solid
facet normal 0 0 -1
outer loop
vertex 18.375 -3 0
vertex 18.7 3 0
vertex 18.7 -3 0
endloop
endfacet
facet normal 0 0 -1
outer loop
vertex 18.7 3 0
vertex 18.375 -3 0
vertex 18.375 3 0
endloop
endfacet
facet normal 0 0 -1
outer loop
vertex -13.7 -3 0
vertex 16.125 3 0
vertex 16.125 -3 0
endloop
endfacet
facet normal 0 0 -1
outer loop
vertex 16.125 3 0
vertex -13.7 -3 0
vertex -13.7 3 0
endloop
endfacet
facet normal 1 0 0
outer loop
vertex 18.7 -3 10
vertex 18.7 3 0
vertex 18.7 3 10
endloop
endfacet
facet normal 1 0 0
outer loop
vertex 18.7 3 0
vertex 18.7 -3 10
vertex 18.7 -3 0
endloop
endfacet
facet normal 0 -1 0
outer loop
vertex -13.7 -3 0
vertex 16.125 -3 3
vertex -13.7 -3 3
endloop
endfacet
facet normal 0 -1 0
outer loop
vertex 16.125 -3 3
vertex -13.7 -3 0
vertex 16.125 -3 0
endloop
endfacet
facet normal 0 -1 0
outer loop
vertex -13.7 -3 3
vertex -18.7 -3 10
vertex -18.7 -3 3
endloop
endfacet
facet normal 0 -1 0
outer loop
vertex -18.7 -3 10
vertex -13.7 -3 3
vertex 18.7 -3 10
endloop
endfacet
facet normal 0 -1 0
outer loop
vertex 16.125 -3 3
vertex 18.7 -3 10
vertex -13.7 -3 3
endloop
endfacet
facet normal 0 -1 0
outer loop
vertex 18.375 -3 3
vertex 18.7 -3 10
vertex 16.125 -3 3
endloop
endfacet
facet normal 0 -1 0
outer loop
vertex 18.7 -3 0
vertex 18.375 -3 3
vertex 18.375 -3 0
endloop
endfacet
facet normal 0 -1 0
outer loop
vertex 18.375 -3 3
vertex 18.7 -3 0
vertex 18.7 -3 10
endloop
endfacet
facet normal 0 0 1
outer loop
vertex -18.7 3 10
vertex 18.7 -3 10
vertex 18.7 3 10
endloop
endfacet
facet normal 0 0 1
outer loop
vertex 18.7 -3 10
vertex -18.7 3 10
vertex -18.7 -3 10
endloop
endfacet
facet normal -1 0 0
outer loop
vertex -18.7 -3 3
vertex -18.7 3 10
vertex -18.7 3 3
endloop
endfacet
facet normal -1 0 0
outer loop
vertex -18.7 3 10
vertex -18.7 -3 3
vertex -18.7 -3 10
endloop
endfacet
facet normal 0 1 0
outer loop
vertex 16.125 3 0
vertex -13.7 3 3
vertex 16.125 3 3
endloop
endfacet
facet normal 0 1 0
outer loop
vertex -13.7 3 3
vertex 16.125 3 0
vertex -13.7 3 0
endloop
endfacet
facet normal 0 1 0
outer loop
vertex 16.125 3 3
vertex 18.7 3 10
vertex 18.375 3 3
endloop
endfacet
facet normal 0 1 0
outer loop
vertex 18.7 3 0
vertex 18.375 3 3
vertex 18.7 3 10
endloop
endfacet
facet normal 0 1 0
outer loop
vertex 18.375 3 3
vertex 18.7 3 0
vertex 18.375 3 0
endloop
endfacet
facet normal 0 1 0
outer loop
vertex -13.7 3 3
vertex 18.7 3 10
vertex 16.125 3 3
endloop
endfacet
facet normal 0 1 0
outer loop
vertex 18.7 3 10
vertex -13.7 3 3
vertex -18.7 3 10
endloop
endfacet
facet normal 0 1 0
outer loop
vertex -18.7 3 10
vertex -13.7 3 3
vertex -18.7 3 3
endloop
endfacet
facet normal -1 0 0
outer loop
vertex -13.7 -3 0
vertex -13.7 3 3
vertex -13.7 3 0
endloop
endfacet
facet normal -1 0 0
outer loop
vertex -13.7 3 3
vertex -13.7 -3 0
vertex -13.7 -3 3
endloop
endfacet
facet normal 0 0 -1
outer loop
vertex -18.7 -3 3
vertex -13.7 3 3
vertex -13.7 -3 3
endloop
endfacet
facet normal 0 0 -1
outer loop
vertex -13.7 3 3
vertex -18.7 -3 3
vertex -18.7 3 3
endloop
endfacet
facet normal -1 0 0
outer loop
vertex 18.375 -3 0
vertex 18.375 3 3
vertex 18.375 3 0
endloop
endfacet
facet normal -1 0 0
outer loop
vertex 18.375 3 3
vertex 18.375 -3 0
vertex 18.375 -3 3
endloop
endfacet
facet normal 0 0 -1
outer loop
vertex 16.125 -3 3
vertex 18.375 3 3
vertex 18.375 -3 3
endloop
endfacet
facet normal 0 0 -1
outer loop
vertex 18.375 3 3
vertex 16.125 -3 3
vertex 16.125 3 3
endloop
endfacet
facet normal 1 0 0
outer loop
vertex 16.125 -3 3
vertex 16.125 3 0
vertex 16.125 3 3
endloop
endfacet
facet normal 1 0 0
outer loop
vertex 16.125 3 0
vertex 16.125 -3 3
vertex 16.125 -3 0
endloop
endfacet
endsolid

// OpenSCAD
// Built by bench/smallmodels/features/compiler.py from a list of features.
$fn = 64;
difference() {
  union() {
    translate([0, 0, 0]) linear_extrude(height = 10) polygon([[-18.7, -3], [18.7, -3], [18.7, 3], [-18.7, 3]]);
    translate([15, 0, 0]) linear_extrude(height = 10) polygon([[-2.25, -2], [2.25, -2], [2.25, 2], [-2.25, 2]]);
  }
  union() {
    translate([-18.7, 0, 0]) rotate([0, 0, 0]) translate([-5, -5, 0]) cube([10, 10, 3]);
    translate([17.25, 0, 0]) rotate([0, 0, 0]) translate([-1.125, -5, 0]) cube([2.25, 10, 3]);
  }
}
